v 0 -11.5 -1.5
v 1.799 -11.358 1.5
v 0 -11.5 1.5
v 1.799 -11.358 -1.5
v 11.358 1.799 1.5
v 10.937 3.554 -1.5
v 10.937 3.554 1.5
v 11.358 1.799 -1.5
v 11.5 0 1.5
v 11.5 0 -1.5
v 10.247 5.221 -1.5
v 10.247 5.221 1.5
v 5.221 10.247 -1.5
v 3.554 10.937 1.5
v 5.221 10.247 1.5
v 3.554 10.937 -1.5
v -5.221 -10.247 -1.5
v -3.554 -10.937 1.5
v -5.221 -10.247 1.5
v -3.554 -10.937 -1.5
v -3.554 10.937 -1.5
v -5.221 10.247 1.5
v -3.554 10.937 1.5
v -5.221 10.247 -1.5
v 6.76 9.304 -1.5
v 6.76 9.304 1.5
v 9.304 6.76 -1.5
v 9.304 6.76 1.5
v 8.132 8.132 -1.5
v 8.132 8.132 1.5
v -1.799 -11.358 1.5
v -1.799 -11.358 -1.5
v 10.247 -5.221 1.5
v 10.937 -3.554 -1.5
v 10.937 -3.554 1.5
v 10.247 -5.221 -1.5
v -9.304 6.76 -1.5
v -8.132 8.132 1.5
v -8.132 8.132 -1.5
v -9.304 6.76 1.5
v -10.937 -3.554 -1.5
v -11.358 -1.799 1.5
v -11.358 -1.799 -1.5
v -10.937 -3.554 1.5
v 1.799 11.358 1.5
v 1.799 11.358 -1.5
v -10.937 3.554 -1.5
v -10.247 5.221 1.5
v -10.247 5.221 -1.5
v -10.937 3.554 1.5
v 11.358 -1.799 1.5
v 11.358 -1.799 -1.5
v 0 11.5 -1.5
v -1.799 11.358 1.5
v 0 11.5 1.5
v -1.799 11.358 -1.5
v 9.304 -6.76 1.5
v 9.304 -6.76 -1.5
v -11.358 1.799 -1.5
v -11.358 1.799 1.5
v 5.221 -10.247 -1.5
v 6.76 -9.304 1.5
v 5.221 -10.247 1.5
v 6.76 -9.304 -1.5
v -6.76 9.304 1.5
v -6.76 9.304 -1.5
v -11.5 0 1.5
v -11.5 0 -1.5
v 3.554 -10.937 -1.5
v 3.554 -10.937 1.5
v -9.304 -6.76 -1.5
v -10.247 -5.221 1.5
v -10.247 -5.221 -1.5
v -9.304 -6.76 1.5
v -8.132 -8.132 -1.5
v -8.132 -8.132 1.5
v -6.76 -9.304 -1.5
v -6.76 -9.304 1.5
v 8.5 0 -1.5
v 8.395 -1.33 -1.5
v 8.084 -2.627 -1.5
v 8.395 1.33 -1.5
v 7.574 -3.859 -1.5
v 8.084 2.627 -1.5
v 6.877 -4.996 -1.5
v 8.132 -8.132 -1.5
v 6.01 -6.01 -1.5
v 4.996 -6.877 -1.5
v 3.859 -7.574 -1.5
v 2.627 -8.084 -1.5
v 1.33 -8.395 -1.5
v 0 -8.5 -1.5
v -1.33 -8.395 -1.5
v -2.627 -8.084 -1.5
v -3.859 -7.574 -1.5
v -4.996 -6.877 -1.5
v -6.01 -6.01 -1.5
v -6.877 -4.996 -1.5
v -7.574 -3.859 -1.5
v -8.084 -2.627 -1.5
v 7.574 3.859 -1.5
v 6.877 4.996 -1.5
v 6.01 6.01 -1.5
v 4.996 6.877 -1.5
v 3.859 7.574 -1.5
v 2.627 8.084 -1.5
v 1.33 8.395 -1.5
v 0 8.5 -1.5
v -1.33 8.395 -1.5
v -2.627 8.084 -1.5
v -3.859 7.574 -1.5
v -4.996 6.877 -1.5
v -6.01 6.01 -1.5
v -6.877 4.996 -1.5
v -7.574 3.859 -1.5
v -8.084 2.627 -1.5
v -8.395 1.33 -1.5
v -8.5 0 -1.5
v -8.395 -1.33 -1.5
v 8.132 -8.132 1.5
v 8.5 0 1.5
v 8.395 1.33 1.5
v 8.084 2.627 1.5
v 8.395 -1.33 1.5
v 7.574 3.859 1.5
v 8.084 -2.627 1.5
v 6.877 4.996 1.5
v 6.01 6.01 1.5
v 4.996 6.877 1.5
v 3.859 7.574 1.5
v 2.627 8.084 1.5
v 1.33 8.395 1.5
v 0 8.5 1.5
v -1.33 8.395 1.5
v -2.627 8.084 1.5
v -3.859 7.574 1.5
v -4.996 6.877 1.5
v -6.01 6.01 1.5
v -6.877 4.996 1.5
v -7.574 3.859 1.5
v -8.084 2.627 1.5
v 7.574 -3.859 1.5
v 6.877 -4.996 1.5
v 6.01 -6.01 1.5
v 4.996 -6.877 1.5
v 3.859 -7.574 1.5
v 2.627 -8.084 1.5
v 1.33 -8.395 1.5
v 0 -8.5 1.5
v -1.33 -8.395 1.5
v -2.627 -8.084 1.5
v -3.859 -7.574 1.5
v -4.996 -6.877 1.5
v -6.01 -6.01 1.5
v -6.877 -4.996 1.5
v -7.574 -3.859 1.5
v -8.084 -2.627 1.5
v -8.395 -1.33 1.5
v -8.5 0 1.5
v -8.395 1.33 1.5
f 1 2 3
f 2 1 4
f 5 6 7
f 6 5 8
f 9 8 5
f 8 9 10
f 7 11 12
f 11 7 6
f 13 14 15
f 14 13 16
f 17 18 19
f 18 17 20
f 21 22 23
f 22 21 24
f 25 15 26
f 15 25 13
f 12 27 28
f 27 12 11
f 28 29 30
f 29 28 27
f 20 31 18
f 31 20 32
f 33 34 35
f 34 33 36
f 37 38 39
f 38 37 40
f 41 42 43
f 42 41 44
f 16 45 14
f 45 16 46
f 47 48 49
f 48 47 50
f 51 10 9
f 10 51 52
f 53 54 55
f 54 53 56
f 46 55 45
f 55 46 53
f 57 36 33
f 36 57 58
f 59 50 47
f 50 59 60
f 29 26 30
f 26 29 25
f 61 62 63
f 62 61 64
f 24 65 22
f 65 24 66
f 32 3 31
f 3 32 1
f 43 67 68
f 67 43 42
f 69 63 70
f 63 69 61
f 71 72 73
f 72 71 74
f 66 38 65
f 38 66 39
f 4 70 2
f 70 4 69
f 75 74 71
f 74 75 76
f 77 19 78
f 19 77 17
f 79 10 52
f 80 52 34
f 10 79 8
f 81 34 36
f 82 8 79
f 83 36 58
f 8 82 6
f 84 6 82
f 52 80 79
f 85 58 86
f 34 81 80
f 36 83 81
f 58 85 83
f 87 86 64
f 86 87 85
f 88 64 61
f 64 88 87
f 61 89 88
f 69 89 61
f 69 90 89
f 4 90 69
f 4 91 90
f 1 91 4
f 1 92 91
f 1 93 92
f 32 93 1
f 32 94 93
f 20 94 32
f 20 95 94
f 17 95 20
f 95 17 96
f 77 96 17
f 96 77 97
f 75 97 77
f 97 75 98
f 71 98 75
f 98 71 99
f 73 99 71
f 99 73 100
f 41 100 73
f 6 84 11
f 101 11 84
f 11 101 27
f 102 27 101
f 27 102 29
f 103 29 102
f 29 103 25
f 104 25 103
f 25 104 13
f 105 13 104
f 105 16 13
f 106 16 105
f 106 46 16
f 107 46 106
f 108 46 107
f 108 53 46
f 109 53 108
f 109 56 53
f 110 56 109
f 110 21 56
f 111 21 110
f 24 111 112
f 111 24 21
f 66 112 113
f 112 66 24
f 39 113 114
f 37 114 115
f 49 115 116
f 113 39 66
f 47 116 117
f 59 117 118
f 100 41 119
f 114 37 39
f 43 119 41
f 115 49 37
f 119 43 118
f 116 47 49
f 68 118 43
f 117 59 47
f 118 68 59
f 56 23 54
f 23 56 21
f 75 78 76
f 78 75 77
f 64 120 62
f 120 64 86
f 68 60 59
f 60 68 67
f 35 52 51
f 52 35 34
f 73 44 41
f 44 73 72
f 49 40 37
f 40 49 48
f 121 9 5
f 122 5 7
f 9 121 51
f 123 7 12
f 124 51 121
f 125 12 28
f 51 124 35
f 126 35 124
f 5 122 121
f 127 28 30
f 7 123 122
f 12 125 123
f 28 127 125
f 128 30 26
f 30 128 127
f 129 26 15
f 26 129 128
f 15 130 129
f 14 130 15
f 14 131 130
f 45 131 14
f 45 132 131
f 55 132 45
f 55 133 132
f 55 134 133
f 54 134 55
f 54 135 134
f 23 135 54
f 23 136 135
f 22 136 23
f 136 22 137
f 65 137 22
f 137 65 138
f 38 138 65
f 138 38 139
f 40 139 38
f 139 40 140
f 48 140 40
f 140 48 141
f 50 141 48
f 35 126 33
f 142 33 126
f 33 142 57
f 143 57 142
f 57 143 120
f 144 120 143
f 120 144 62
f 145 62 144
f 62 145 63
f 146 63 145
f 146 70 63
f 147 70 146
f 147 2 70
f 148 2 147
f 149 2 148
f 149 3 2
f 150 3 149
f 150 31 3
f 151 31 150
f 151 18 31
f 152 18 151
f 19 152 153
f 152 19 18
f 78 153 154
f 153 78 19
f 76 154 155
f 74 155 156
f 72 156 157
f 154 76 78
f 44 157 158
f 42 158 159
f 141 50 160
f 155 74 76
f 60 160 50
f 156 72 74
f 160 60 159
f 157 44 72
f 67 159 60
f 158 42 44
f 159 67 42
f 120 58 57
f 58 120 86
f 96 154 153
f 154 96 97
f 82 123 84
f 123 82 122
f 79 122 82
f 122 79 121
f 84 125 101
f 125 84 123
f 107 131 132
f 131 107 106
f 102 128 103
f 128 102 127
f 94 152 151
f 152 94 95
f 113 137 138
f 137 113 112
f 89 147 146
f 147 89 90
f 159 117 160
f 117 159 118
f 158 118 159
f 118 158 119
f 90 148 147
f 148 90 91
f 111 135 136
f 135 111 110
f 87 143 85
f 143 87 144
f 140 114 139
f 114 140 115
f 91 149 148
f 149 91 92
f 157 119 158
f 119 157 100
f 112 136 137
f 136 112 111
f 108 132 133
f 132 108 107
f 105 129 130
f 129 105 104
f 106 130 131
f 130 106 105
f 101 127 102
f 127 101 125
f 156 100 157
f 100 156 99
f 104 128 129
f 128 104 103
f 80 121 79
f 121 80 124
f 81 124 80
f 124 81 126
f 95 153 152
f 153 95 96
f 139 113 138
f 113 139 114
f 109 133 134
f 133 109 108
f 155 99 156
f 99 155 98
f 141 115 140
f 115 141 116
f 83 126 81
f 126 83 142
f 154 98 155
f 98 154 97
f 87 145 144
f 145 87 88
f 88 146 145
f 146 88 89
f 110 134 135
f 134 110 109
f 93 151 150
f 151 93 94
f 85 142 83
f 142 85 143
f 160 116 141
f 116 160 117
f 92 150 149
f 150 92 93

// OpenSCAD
//Author: Piotr Paterek, Kraków 05-08.2016
$fn=40;
difference()
{
cylinder(r=11.5,h=3, center=true);
cylinder(r=8.5,h=3, center=true);
}
